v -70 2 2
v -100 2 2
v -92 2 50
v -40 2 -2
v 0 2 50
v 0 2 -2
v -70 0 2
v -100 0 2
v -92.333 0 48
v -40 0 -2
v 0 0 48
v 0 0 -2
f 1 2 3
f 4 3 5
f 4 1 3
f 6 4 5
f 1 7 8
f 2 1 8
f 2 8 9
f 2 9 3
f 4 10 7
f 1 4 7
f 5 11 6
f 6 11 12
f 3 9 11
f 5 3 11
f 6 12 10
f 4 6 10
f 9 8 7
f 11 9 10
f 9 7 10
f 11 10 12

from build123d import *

# Parameters (mm, degrees)
BOSS_EXTRUDE1_DEPTH = 2
CHAMFER1_SIZE       = 2


with BuildPart() as part:
    # Sketch1 → Boss-Extrude1 (new body)
    with BuildSketch(Plane(origin=(0, 0, 0), x_dir=(1, 0, 0), z_dir=(0, 1, 0))):
        Polygon((0, -50), (0, 0), (0, 2), (-40, 2), (-70, -2), (-100, -2), (-92, -50), align=None)
    extrude(amount=BOSS_EXTRUDE1_DEPTH)

    # Chamfer1
    chamfer1_edges = [part.edges().sort_by_distance(p)[0] for p in [
        (-46, 0, 50),
    ]]
    chamfer(chamfer1_edges, length=CHAMFER1_SIZE - 0.0001)  # a hair under: the kernel refuses the full size


solid = part.part
